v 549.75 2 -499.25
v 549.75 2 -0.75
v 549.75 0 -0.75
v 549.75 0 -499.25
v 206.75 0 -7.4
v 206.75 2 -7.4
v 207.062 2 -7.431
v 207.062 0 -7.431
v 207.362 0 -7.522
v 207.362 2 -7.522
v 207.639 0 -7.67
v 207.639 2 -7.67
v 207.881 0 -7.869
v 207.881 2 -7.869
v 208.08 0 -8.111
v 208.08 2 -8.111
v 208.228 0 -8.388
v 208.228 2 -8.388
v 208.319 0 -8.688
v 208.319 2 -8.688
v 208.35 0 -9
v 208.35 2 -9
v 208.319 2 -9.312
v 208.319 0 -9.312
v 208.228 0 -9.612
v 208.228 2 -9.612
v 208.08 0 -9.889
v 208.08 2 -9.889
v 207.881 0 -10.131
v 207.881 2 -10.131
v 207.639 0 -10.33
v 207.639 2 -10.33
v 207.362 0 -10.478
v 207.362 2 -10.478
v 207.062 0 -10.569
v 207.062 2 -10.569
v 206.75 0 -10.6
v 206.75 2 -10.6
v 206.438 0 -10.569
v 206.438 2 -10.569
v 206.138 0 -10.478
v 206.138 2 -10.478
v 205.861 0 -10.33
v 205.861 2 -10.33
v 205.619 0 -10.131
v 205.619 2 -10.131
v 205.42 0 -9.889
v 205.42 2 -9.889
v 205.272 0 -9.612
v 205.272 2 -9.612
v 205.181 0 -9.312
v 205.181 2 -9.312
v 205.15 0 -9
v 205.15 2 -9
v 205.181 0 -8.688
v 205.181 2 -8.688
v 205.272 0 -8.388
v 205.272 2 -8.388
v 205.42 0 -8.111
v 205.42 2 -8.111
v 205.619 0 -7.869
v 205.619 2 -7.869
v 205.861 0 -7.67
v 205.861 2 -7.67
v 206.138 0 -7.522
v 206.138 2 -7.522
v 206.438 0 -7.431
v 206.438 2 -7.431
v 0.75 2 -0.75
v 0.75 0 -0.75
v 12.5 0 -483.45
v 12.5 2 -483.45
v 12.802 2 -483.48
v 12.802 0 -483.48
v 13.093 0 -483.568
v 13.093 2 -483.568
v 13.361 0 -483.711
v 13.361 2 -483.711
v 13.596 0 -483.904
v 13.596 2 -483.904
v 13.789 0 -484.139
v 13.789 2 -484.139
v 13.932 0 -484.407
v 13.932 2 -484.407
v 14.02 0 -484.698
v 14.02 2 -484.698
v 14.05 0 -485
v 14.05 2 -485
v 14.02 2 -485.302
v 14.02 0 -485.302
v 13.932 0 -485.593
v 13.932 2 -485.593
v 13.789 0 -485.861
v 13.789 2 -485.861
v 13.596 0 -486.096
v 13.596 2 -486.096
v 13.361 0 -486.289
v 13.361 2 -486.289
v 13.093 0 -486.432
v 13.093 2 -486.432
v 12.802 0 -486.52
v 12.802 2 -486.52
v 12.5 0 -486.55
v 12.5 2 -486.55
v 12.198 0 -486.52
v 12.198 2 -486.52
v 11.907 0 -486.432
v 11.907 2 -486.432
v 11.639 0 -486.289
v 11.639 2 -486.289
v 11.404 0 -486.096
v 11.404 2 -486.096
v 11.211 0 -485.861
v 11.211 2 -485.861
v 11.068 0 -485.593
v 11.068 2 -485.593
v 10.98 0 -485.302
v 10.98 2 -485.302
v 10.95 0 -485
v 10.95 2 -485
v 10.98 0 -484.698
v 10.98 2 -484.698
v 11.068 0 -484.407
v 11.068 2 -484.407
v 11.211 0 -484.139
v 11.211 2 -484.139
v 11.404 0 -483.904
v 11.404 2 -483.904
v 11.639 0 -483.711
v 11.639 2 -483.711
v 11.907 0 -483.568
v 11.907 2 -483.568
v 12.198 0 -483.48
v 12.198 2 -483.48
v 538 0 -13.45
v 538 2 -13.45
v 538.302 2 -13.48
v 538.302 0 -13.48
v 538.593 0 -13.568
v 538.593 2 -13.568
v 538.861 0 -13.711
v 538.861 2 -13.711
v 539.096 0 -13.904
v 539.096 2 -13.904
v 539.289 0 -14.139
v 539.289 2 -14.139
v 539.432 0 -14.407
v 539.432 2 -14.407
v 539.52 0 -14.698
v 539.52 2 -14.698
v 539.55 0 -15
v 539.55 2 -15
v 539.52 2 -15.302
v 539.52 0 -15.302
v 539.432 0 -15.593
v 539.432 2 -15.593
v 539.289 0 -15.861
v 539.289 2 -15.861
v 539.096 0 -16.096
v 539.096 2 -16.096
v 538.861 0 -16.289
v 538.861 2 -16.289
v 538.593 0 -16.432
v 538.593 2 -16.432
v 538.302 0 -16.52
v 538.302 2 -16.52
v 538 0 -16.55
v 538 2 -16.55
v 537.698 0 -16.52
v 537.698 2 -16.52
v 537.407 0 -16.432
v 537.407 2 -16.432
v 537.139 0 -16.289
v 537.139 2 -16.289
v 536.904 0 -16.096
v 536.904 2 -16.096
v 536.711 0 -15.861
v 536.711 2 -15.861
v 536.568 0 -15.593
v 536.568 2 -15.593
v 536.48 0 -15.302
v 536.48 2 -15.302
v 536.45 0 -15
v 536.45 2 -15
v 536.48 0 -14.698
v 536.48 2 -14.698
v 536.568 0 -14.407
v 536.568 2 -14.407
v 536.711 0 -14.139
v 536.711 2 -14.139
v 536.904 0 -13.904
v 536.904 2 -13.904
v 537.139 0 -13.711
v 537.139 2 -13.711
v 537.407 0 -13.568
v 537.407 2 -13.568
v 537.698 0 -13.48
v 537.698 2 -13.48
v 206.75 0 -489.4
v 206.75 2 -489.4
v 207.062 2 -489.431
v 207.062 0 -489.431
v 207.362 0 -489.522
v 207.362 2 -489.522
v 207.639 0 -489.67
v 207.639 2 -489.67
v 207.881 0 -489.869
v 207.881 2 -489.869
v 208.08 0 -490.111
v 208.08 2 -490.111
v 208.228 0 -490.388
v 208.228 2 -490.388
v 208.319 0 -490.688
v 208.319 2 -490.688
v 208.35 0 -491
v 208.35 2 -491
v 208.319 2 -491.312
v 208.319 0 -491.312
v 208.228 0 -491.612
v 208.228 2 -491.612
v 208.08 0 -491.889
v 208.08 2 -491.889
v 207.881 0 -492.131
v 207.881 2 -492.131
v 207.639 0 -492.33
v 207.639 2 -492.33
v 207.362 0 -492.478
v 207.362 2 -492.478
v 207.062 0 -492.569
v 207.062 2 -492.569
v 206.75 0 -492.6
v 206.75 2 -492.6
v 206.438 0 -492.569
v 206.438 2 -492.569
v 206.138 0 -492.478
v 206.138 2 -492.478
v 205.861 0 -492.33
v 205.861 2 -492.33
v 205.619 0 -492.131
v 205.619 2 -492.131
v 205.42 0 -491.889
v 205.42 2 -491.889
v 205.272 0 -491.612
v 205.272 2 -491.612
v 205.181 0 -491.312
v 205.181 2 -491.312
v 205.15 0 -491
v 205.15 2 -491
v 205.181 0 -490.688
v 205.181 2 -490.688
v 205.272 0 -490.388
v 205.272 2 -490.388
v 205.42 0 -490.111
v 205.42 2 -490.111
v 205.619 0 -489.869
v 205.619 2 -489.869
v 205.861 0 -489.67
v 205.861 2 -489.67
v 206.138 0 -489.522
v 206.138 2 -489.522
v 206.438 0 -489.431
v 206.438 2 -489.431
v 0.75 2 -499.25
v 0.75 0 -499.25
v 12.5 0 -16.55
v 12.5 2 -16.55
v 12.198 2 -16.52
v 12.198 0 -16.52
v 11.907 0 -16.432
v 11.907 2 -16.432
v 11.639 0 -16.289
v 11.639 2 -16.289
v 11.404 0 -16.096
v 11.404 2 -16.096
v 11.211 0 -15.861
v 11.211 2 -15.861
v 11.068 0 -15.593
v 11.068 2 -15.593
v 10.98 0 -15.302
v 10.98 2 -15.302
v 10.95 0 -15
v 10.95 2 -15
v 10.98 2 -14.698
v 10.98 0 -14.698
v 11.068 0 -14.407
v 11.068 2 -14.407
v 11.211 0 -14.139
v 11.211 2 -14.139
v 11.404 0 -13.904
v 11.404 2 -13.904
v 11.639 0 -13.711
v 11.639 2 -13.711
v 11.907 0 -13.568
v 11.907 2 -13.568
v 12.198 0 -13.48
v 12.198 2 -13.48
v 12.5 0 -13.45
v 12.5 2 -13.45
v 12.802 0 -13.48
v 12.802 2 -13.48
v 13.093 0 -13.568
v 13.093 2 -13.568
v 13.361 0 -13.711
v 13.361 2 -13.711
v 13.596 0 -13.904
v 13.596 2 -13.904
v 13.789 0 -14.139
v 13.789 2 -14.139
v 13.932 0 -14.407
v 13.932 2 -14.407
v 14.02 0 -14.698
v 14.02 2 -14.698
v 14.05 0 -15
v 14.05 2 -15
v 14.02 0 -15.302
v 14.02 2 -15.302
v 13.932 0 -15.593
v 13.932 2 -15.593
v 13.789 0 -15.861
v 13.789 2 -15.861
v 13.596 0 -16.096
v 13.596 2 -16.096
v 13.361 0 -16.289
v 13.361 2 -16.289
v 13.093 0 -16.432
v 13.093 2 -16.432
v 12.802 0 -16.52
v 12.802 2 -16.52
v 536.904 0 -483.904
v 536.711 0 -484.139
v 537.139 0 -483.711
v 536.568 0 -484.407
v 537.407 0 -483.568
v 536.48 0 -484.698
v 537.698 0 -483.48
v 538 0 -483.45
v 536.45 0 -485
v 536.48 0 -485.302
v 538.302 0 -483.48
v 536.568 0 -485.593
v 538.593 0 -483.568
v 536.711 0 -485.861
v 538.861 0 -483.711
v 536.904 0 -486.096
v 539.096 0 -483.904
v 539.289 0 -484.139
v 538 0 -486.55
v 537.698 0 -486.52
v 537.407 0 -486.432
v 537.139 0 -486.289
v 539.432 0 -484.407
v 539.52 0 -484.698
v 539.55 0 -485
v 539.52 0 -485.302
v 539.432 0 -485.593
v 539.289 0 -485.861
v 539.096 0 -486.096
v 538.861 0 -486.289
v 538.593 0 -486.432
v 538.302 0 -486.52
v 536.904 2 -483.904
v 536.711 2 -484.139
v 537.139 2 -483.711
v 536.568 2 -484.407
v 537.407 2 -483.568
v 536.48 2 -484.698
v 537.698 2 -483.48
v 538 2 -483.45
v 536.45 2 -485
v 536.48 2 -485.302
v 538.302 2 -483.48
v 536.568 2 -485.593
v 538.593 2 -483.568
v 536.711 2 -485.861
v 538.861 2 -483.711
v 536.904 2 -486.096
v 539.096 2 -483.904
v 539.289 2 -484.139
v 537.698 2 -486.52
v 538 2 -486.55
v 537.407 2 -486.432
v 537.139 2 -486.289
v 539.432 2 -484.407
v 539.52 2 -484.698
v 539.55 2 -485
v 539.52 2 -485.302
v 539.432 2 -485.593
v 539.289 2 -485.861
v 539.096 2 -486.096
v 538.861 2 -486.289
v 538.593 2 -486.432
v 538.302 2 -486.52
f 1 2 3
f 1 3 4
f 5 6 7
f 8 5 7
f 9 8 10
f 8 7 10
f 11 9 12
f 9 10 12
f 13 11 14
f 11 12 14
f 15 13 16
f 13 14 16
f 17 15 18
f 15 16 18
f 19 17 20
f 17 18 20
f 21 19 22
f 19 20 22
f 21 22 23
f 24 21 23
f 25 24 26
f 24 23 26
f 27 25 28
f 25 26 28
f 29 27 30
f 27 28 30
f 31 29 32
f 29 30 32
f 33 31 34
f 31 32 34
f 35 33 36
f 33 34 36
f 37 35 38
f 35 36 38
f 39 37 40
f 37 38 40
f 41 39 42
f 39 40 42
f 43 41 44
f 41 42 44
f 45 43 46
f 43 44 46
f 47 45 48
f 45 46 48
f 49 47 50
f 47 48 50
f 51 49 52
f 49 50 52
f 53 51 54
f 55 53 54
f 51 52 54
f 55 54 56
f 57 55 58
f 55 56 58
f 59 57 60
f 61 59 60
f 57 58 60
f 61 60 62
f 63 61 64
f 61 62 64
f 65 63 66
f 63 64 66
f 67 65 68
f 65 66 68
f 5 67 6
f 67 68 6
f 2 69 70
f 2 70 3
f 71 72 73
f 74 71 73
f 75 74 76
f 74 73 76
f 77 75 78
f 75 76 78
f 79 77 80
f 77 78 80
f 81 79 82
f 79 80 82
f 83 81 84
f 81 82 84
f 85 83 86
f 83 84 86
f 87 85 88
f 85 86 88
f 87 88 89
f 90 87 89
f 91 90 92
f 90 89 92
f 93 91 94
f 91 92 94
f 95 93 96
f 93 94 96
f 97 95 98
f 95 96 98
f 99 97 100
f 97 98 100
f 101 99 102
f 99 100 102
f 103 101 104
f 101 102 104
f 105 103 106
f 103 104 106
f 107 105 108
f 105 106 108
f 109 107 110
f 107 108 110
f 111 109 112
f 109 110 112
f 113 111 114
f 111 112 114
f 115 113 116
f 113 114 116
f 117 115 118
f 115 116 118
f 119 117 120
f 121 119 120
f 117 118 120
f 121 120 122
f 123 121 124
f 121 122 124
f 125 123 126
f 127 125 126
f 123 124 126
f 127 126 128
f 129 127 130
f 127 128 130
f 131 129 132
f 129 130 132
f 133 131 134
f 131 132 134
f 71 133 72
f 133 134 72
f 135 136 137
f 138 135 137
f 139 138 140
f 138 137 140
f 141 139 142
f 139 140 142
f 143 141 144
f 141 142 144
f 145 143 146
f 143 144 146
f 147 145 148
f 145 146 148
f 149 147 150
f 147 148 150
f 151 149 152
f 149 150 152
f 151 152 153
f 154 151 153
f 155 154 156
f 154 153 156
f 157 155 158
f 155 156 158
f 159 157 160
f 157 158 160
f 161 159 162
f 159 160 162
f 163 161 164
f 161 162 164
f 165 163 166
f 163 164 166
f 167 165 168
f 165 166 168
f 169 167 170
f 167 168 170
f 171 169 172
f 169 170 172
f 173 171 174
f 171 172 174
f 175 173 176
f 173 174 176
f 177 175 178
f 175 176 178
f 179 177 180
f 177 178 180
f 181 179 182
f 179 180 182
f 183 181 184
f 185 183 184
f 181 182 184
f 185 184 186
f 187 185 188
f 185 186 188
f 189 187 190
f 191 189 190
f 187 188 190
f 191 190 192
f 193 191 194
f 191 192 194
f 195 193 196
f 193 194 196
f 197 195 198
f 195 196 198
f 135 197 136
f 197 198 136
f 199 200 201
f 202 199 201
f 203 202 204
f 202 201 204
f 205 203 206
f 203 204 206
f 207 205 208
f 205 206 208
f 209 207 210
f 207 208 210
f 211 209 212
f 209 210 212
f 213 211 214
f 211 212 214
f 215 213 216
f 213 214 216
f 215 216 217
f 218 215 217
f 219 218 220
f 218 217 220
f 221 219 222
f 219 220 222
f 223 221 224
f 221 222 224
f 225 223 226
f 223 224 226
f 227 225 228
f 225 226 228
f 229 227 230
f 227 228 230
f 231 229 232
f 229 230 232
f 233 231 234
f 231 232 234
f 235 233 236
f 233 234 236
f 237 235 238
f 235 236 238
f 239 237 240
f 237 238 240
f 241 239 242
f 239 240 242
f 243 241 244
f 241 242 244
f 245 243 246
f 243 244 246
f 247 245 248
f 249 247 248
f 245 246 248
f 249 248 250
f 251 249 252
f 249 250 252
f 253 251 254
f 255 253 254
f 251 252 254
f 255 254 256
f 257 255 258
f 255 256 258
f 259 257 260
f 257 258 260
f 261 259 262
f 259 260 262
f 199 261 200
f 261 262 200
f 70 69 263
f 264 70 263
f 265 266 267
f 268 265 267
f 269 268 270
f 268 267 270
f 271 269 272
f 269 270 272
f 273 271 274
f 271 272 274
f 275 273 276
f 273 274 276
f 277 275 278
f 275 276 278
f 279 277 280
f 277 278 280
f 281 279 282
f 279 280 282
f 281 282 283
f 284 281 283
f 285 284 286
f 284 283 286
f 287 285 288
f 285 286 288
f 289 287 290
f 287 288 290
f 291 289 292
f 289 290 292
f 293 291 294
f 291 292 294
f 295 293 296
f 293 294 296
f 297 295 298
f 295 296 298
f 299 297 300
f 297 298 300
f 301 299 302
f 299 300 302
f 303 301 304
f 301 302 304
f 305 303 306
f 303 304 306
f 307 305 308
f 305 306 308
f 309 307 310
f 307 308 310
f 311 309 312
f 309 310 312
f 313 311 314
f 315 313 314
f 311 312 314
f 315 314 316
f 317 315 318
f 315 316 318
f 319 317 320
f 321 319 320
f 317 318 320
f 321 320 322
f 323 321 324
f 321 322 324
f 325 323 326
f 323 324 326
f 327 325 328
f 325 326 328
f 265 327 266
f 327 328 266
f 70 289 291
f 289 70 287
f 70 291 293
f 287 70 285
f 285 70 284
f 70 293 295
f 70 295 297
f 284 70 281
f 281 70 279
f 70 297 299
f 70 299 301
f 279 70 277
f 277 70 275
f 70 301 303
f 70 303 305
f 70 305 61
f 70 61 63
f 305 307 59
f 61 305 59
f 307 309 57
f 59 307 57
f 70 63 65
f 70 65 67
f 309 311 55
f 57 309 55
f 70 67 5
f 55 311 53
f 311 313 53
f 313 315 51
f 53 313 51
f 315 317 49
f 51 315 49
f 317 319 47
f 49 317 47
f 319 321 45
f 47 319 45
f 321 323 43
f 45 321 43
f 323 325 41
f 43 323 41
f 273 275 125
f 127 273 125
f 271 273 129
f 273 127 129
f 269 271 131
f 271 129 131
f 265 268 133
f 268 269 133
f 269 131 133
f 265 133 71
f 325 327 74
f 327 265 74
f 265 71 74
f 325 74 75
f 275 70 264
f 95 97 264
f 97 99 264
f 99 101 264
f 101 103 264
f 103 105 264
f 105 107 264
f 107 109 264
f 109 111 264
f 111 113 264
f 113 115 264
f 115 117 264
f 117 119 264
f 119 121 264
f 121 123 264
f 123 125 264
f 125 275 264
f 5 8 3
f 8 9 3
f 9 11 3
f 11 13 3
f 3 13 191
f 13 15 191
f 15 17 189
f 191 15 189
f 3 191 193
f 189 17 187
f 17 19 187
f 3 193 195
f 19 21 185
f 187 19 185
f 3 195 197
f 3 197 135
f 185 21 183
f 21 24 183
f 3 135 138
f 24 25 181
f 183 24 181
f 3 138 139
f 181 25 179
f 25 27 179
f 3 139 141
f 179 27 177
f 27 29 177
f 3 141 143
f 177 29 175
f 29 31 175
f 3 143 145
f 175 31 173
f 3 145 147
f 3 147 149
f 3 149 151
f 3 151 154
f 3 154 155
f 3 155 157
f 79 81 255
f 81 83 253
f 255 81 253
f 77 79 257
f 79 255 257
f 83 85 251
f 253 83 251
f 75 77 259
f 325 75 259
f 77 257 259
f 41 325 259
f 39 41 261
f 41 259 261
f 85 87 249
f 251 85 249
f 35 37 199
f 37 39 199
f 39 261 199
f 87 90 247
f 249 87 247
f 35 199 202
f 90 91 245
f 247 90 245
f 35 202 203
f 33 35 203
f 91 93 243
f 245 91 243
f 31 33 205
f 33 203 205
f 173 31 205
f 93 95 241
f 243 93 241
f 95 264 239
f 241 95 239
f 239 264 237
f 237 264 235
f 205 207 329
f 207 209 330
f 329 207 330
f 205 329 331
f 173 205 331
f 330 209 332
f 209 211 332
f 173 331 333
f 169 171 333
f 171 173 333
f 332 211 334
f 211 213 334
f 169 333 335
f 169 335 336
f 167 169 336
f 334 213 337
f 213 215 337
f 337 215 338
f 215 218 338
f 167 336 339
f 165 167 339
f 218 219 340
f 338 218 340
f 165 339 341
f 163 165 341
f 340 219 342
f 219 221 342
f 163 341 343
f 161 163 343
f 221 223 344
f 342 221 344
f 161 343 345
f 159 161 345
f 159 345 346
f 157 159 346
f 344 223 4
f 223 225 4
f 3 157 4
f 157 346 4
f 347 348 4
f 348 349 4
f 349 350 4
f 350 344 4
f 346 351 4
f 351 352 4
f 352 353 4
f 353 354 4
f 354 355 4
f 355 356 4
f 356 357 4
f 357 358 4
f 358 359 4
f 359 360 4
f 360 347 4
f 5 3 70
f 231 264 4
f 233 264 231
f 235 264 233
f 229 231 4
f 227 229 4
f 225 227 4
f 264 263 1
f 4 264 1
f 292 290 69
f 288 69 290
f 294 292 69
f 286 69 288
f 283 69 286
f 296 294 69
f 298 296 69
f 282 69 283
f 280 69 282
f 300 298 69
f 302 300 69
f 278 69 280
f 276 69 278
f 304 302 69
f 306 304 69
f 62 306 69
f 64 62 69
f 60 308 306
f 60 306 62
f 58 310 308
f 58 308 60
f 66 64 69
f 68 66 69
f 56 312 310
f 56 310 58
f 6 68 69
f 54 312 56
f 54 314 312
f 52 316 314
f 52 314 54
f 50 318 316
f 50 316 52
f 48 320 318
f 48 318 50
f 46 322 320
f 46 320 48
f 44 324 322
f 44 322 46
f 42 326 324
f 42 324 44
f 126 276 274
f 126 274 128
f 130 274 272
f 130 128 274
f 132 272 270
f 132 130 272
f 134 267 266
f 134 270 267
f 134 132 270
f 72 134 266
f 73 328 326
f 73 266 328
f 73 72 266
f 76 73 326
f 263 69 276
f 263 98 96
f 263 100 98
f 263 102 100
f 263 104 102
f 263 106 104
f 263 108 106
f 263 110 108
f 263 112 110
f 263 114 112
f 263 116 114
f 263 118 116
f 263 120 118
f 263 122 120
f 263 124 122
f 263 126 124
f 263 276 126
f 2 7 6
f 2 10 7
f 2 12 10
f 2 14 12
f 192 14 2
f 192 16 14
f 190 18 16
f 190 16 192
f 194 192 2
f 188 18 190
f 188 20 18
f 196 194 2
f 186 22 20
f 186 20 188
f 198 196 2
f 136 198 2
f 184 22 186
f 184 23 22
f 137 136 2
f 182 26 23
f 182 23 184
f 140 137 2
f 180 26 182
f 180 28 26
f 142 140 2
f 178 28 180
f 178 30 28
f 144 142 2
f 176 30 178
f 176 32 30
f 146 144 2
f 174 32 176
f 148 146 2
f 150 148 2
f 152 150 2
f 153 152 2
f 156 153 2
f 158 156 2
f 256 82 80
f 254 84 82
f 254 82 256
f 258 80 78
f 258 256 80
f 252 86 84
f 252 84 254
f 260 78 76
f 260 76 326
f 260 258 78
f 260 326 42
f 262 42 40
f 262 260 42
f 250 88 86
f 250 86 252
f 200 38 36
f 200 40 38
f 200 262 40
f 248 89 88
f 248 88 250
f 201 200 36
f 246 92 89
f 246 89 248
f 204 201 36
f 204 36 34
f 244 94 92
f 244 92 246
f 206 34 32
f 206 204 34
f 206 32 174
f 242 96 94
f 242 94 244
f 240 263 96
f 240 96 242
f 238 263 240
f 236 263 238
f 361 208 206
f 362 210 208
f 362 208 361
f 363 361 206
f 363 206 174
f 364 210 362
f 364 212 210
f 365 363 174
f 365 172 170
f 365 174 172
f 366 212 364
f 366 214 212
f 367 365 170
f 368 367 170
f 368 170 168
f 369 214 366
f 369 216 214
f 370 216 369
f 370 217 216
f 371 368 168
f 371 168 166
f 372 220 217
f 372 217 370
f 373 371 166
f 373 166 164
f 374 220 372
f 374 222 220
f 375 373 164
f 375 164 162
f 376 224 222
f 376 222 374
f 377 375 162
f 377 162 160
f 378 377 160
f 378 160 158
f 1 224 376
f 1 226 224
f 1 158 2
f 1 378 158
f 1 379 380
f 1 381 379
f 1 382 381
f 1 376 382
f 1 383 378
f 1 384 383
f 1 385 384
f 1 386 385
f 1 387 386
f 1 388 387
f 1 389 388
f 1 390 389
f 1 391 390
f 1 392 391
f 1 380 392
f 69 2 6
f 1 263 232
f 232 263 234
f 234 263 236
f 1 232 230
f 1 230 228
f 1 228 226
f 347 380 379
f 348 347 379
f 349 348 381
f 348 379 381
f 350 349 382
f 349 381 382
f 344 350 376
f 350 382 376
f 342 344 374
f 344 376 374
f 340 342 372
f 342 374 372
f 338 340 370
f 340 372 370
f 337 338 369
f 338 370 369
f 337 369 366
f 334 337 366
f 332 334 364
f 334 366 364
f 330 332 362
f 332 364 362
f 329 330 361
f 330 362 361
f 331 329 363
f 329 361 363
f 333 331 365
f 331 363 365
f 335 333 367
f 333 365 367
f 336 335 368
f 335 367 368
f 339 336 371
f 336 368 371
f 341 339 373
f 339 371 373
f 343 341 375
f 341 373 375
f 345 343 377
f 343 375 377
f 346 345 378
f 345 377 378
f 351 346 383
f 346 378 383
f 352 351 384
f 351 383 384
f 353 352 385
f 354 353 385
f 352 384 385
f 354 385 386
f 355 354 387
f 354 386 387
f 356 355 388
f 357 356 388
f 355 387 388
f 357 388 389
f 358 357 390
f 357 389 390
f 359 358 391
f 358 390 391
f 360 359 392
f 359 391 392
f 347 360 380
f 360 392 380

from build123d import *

# Parameters (mm, degrees)
CROQUIS1_W              = 550.5
CROQUIS1_H              = 500
SALIENTE_EXTRUIR1_DEPTH = 2
CROQUIS2_R              = 1.55
CORTAR_EXTRUIR1_DEPTH   = 2
CROQUIS3_W              = 550.5
CROQUIS3_H              = 500
CROQUIS3_W_2            = 549
CROQUIS3_H_2            = 498.5
CORTAR_EXTRUIR2_DEPTH   = 2
CROQUIS4_R              = 1.6
CORTAR_EXTRUIR3_DEPTH   = 2


with BuildPart() as part:
    # Croquis1 → Saliente-Extruir1 (new body)
    with BuildSketch(Plane(origin=(0, 0, 0), x_dir=(1, 0, 0), z_dir=(0, 1, 0))):
        with Locations((275.25, 250)):
            Rectangle(CROQUIS1_W, CROQUIS1_H)
    extrude(amount=SALIENTE_EXTRUIR1_DEPTH)

    # Croquis2 → Cortar-Extruir1 (cut)
    with BuildSketch(Plane(origin=(0, 2, 0), x_dir=(1, 0, 0), z_dir=(0, 1, 0))):
        with Locations(Location((12.5, 485, 0), (0, 0, 270))):
            Circle(CROQUIS2_R)
        with Locations(Location((538, 485, 0), (0, 0, 90))):
            Circle(CROQUIS2_R)
        with Locations(Location((538, 15, 0), (0, 0, 270))):
            Circle(CROQUIS2_R)
        with Locations(Location((12.5, 15, 0), (0, 0, 90))):
            Circle(CROQUIS2_R)
    extrude(amount=-CORTAR_EXTRUIR1_DEPTH, mode=Mode.SUBTRACT)

    # Croquis3 → Cortar-Extruir2 (cut)
    with BuildSketch(Plane(origin=(0, 2, 0), x_dir=(1, 0, 0), z_dir=(0, 1, 0))):
        with Locations((275.25, 250)):
            Rectangle(CROQUIS3_W, CROQUIS3_H)
        with Locations((275.25, 250)):
            Rectangle(CROQUIS3_W_2, CROQUIS3_H_2, mode=Mode.SUBTRACT)
    extrude(amount=-CORTAR_EXTRUIR2_DEPTH, mode=Mode.SUBTRACT)

    # Croquis4 → Cortar-Extruir3 (cut)
    with BuildSketch(Plane(origin=(0, 2, 0), x_dir=(1, 0, 0), z_dir=(0, 1, 0))):
        with Locations(Location((206.75, 491, 0), (0, 0, 270))):
            Circle(CROQUIS4_R)
        with Locations(Location((206.75, 9, 0), (0, 0, 270))):
            Circle(CROQUIS4_R)
    extrude(amount=-CORTAR_EXTRUIR3_DEPTH, mode=Mode.SUBTRACT)


solid = part.part
